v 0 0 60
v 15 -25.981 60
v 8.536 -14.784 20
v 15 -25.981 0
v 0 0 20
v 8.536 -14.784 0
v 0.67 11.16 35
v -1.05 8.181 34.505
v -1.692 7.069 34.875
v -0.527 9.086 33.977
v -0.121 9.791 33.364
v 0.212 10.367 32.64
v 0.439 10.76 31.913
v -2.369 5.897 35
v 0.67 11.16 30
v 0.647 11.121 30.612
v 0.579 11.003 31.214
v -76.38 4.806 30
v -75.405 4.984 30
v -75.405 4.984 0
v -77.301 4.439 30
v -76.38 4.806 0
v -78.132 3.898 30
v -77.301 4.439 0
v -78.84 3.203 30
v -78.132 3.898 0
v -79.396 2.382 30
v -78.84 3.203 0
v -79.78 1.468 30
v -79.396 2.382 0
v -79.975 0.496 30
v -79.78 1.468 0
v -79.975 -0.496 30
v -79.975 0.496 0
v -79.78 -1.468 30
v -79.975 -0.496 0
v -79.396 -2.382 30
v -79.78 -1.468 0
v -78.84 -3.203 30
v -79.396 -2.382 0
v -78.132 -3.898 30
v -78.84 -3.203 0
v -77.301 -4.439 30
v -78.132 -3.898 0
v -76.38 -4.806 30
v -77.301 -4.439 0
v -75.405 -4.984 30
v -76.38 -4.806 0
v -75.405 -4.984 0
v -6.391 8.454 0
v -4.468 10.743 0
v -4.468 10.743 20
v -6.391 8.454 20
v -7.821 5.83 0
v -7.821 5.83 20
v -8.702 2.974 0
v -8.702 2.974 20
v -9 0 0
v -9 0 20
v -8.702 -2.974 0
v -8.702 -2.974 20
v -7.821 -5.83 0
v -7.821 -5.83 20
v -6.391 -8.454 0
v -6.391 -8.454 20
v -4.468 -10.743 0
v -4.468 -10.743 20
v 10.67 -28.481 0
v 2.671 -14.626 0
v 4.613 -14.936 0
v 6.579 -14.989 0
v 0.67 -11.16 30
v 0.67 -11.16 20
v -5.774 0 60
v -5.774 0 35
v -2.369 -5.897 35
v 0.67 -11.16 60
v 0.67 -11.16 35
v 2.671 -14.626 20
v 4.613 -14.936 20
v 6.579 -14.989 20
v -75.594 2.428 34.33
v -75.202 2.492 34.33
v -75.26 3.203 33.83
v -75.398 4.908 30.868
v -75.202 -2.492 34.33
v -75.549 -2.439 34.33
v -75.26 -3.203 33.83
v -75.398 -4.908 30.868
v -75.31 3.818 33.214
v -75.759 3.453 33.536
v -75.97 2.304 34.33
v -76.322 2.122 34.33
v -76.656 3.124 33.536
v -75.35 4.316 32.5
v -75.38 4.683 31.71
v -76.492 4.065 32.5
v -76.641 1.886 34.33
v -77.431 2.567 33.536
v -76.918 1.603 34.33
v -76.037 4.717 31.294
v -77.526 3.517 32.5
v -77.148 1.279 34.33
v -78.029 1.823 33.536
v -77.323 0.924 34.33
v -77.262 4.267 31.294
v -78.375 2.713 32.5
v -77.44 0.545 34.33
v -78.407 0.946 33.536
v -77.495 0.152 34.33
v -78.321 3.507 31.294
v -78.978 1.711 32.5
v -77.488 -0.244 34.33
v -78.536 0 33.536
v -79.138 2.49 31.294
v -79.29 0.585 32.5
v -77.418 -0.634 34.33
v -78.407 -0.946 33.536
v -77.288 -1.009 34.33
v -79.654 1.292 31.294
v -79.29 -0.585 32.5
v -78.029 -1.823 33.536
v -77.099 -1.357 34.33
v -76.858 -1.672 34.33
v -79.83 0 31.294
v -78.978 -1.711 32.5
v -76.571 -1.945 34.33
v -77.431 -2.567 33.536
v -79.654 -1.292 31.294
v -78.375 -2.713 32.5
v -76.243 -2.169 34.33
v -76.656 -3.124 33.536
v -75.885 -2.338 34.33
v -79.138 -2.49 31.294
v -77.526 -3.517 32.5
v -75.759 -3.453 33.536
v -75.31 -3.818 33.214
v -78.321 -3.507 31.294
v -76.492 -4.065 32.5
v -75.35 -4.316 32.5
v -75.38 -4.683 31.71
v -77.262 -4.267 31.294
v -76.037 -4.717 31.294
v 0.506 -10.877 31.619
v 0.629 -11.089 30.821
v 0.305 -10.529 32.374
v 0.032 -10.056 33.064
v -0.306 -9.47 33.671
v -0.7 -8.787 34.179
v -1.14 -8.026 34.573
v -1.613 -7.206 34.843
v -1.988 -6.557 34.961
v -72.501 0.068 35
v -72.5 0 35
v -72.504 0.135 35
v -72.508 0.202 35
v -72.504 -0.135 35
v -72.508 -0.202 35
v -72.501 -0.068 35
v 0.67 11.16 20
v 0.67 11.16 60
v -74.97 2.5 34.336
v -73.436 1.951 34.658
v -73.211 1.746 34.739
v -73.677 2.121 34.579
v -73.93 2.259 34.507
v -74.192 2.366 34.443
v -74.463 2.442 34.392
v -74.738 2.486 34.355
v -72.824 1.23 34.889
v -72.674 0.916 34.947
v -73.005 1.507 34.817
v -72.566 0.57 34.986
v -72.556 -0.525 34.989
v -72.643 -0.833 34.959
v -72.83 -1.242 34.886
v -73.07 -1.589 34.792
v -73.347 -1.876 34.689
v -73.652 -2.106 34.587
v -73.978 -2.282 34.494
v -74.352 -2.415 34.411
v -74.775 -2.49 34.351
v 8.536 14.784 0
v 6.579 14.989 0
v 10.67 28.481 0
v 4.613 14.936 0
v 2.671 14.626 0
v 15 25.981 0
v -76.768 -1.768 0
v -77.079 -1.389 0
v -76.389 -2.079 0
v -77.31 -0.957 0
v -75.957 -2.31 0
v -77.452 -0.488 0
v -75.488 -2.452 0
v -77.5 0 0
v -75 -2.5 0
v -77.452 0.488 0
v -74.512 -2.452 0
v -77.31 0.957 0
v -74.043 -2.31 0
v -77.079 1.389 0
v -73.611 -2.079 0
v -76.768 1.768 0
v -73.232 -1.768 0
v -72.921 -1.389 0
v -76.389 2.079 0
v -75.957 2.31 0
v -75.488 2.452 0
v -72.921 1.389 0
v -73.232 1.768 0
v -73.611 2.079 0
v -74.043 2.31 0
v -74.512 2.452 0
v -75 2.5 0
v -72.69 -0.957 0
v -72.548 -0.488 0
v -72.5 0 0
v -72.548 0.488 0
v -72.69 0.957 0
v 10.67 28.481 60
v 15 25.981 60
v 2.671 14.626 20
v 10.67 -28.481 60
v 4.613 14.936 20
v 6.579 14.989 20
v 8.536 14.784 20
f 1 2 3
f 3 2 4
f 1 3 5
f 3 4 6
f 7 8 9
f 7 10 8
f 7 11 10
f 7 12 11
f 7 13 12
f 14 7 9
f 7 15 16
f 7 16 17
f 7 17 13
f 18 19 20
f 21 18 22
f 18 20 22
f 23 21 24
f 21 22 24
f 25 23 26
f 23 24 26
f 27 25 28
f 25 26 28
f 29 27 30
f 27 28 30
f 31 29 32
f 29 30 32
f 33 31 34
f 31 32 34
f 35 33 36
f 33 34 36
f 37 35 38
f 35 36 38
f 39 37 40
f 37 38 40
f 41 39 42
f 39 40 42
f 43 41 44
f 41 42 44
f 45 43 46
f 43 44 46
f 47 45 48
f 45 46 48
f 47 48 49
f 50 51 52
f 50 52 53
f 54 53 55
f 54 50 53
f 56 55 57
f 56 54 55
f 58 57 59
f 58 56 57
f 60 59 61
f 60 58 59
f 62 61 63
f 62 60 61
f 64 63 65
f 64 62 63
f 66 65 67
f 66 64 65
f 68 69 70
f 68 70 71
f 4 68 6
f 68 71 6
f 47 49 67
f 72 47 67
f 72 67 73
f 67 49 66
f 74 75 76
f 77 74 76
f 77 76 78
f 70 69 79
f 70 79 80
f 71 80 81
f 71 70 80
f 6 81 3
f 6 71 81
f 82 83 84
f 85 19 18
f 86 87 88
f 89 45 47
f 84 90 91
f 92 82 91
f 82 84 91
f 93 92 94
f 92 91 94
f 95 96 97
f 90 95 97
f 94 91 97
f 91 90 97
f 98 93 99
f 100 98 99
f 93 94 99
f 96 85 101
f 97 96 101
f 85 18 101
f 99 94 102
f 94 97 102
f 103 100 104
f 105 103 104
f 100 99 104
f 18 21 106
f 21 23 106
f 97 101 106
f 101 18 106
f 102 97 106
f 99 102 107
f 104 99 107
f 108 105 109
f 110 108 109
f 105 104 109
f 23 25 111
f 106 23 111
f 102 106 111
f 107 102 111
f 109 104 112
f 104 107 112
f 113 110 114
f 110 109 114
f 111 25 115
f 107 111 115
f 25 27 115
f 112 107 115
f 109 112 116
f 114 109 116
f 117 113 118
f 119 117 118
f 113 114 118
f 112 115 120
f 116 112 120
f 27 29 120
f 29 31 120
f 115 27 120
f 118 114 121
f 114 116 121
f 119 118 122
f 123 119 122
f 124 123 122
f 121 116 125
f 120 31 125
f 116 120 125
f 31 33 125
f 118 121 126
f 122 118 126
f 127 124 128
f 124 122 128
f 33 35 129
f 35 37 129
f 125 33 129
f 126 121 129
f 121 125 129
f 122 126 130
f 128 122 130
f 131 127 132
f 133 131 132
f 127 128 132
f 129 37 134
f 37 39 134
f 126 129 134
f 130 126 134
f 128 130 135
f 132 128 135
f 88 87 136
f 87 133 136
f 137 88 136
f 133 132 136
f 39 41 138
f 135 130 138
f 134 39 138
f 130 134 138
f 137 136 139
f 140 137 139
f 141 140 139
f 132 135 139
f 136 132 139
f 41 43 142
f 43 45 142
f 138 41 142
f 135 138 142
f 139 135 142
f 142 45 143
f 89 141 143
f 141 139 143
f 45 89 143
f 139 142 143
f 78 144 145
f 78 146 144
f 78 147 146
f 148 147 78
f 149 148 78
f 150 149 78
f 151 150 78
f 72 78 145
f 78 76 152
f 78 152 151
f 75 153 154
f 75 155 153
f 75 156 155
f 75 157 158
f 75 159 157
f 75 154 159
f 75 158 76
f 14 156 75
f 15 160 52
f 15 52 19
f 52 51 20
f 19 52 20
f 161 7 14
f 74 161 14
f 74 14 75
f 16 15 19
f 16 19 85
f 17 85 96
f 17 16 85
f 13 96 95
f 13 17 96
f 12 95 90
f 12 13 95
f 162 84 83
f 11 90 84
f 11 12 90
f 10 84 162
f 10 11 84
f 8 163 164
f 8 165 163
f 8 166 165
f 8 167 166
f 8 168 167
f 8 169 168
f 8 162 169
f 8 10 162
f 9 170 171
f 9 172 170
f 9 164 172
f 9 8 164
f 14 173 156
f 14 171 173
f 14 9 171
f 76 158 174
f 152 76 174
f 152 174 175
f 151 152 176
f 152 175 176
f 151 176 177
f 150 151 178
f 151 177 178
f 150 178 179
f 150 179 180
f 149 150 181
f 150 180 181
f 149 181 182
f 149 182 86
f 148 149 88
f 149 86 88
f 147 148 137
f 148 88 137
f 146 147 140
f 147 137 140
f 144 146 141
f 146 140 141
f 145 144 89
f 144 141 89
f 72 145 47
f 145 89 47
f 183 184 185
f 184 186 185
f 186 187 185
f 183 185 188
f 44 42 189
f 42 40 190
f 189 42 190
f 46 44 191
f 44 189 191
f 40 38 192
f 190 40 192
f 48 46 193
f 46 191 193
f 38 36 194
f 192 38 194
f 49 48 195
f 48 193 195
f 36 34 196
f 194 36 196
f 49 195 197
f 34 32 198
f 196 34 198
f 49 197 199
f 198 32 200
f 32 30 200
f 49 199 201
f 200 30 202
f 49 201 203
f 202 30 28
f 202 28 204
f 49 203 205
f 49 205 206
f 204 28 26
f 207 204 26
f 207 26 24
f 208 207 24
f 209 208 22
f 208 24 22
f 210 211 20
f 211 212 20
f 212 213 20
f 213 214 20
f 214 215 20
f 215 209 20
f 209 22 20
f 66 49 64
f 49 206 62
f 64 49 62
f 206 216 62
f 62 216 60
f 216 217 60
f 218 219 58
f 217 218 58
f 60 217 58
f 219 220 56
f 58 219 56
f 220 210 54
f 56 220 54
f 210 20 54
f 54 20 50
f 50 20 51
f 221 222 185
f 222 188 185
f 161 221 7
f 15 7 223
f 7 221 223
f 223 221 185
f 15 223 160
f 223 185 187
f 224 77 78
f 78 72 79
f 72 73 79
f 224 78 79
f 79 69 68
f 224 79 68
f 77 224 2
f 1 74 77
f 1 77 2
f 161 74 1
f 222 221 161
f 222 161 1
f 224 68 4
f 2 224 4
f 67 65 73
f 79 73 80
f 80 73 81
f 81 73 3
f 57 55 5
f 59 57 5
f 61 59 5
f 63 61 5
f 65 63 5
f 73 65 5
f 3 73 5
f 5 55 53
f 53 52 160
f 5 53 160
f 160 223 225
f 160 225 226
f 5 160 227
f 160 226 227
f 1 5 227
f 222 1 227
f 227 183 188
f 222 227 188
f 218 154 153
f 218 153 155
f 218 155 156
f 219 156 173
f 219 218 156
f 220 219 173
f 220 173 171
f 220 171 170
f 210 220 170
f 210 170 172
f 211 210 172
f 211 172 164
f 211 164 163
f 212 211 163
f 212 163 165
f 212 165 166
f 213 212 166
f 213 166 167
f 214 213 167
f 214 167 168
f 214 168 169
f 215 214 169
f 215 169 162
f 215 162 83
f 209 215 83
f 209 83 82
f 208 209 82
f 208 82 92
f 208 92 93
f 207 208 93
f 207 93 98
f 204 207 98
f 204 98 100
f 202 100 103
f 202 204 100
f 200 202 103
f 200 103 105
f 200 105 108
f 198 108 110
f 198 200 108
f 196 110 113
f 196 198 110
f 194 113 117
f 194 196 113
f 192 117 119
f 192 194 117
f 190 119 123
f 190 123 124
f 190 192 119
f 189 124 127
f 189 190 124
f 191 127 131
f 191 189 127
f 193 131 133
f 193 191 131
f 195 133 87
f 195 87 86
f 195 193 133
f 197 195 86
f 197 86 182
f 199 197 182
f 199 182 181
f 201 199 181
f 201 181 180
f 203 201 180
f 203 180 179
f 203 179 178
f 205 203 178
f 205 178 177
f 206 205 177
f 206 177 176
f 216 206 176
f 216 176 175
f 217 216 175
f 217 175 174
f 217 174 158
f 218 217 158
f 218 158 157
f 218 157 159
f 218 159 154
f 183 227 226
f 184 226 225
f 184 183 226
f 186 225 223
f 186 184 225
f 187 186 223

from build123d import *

# Parameters (mm, degrees)
F0_R         = 2.5
F1_DEPTH     = 35
F3_DEPTH     = 25
F4_T4_DEPTH  = 88.824838337
F4_T9_DEPTH  = 88.824838337
F4_T12_ANGLE = 170.716427301
F5_R         = 15
F6_DEPTH     = 20


# Not quite as in the source:
# - a fillet or chamfer that OpenCascade refuses, or shapes differently, is made with other operations: its cross-section is extruded or revolved along the edge and cut away or added


with BuildPart() as f1:
    # F0 (on Top) → F1 (new body)
    with BuildSketch(Plane.XY):
        with BuildLine():
            Line((0.6698729811, 11.1602540378), (-75.4046293156, 4.9836006177))
            ThreePointArc((-75.4046293156, 4.9836006177), (-80, 0), (-75.4046293156, -4.9836006177))
            Line((-75.4046293156, -4.9836006177), (0.6698729811, -11.1602540378))
            Line((0.6698729811, -11.1602540378), (10.6698729811, -28.4807621135))
            Line((10.6698729811, -28.4807621135), (15, -25.9807621135))
            Line((15, -25.9807621135), (0, 0))
            Line((0, 0), (15, 25.9807621135))
            Line((15, 25.9807621135), (10.6698729811, 28.4807621135))
            Line((10.6698729811, 28.4807621135), (0.6698729811, 11.1602540378))
        make_face()
        with Locations((-75, 0)):
            Circle(F0_R, mode=Mode.SUBTRACT)
    extrude(amount=F1_DEPTH)

    # F2 (on face) → F3 (join)
    with BuildSketch(Plane.XY.offset(35)):
        Polygon((15, -25.9807621135), (0, 0), (15, 25.9807621135), (10.6698729811, 28.4807621135), (0.6698729811, 11.1602540378), (-5.7735026919, 0), (0.6698729811, -11.1602540378), (10.6698729811, -28.4807621135), align=None)
    extrude(amount=F3_DEPTH)

    # F4: fillet of radius 5 on 2 edges, made by hand


with BuildPart() as f4_tool2:
    # F4_s3 → F4_t4 (new body)
    with BuildSketch(Plane(origin=(-74.5088253508, 6.0495327217, 0), x_dir=(0, 0, 1), z_dir=(0.9967201235, -0.0809258631, 0))):
        with BuildLine():
            ThreePointArc((35, 6.0694397342), (33.5355339059, 9.6049736401), (30, 11.0694397342))
            Line((30, 11.0694397342), (35, 11.0694397342))
            Line((35, 11.0694397342), (35, 6.0694397342))
        make_face()
    extrude(amount=F4_T4_DEPTH)

    split(bisect_by=Plane(origin=(-4.3301270189, -2.5, 0), x_dir=(0, 0, 1), z_dir=(-0.8660254038, -0.5, 0)), keep=Keep.TOP)


with BuildPart() as f1_1:
    add(f1.part)

    # F4_t1: cut F4_tool2
    add(f4_tool2.part, mode=Mode.SUBTRACT)


with BuildPart() as f4_tool7:
    # F4_s8 → F4_t9 (new body)
    with BuildSketch(Plane(origin=(14.0246784902, 1.1386939874, 0), x_dir=(0, 0, 1), z_dir=(-0.9967201235, -0.0809258631, 0))):
        with BuildLine():
            ThreePointArc((30, 11.0694397342), (33.5355339059, 9.6049736401), (35, 6.0694397342))
            Line((35, 6.0694397342), (35, 11.0694397342))
            Line((35, 11.0694397342), (30, 11.0694397342))
        make_face()
    extrude(amount=F4_T9_DEPTH)

    split(bisect_by=Plane(origin=(-4.3301270189, 2.5, 0), x_dir=(0, 0, 1), z_dir=(-0.8660254038, 0.5, 0)), keep=Keep.TOP)


with BuildPart() as f1_2:
    add(f1_1.part)

    # F4_t6: cut F4_tool7
    add(f4_tool7.part, mode=Mode.SUBTRACT)

    # F4_s11 → F4_t12 (revolve, cut)
    with BuildSketch(Plane(origin=(-74.5088253508, -6.0495327217, 0), x_dir=(0, 0, 1), z_dir=(0.9967201235, 0.0809258631, 0))):
        with BuildLine():
            ThreePointArc((35, -6.0694397342), (33.5355339059, -9.6049736401), (30, -11.0694397342))
            Line((30, -11.0694397342), (35, -11.0694397342))
            Line((35, -11.0694397342), (35, -6.0694397342))
        make_face()
    revolve(axis=Axis((-75, 0, 35), (0, 0, 1)), revolution_arc=F4_T12_ANGLE, mode=Mode.SUBTRACT)

    # F5 (on Top) → F6 (cut)
    with BuildSketch(Plane.XY):
        with Locations((6, 0)):
            Circle(F5_R)
    extrude(amount=F6_DEPTH, mode=Mode.SUBTRACT)


solid = f1_2.part
